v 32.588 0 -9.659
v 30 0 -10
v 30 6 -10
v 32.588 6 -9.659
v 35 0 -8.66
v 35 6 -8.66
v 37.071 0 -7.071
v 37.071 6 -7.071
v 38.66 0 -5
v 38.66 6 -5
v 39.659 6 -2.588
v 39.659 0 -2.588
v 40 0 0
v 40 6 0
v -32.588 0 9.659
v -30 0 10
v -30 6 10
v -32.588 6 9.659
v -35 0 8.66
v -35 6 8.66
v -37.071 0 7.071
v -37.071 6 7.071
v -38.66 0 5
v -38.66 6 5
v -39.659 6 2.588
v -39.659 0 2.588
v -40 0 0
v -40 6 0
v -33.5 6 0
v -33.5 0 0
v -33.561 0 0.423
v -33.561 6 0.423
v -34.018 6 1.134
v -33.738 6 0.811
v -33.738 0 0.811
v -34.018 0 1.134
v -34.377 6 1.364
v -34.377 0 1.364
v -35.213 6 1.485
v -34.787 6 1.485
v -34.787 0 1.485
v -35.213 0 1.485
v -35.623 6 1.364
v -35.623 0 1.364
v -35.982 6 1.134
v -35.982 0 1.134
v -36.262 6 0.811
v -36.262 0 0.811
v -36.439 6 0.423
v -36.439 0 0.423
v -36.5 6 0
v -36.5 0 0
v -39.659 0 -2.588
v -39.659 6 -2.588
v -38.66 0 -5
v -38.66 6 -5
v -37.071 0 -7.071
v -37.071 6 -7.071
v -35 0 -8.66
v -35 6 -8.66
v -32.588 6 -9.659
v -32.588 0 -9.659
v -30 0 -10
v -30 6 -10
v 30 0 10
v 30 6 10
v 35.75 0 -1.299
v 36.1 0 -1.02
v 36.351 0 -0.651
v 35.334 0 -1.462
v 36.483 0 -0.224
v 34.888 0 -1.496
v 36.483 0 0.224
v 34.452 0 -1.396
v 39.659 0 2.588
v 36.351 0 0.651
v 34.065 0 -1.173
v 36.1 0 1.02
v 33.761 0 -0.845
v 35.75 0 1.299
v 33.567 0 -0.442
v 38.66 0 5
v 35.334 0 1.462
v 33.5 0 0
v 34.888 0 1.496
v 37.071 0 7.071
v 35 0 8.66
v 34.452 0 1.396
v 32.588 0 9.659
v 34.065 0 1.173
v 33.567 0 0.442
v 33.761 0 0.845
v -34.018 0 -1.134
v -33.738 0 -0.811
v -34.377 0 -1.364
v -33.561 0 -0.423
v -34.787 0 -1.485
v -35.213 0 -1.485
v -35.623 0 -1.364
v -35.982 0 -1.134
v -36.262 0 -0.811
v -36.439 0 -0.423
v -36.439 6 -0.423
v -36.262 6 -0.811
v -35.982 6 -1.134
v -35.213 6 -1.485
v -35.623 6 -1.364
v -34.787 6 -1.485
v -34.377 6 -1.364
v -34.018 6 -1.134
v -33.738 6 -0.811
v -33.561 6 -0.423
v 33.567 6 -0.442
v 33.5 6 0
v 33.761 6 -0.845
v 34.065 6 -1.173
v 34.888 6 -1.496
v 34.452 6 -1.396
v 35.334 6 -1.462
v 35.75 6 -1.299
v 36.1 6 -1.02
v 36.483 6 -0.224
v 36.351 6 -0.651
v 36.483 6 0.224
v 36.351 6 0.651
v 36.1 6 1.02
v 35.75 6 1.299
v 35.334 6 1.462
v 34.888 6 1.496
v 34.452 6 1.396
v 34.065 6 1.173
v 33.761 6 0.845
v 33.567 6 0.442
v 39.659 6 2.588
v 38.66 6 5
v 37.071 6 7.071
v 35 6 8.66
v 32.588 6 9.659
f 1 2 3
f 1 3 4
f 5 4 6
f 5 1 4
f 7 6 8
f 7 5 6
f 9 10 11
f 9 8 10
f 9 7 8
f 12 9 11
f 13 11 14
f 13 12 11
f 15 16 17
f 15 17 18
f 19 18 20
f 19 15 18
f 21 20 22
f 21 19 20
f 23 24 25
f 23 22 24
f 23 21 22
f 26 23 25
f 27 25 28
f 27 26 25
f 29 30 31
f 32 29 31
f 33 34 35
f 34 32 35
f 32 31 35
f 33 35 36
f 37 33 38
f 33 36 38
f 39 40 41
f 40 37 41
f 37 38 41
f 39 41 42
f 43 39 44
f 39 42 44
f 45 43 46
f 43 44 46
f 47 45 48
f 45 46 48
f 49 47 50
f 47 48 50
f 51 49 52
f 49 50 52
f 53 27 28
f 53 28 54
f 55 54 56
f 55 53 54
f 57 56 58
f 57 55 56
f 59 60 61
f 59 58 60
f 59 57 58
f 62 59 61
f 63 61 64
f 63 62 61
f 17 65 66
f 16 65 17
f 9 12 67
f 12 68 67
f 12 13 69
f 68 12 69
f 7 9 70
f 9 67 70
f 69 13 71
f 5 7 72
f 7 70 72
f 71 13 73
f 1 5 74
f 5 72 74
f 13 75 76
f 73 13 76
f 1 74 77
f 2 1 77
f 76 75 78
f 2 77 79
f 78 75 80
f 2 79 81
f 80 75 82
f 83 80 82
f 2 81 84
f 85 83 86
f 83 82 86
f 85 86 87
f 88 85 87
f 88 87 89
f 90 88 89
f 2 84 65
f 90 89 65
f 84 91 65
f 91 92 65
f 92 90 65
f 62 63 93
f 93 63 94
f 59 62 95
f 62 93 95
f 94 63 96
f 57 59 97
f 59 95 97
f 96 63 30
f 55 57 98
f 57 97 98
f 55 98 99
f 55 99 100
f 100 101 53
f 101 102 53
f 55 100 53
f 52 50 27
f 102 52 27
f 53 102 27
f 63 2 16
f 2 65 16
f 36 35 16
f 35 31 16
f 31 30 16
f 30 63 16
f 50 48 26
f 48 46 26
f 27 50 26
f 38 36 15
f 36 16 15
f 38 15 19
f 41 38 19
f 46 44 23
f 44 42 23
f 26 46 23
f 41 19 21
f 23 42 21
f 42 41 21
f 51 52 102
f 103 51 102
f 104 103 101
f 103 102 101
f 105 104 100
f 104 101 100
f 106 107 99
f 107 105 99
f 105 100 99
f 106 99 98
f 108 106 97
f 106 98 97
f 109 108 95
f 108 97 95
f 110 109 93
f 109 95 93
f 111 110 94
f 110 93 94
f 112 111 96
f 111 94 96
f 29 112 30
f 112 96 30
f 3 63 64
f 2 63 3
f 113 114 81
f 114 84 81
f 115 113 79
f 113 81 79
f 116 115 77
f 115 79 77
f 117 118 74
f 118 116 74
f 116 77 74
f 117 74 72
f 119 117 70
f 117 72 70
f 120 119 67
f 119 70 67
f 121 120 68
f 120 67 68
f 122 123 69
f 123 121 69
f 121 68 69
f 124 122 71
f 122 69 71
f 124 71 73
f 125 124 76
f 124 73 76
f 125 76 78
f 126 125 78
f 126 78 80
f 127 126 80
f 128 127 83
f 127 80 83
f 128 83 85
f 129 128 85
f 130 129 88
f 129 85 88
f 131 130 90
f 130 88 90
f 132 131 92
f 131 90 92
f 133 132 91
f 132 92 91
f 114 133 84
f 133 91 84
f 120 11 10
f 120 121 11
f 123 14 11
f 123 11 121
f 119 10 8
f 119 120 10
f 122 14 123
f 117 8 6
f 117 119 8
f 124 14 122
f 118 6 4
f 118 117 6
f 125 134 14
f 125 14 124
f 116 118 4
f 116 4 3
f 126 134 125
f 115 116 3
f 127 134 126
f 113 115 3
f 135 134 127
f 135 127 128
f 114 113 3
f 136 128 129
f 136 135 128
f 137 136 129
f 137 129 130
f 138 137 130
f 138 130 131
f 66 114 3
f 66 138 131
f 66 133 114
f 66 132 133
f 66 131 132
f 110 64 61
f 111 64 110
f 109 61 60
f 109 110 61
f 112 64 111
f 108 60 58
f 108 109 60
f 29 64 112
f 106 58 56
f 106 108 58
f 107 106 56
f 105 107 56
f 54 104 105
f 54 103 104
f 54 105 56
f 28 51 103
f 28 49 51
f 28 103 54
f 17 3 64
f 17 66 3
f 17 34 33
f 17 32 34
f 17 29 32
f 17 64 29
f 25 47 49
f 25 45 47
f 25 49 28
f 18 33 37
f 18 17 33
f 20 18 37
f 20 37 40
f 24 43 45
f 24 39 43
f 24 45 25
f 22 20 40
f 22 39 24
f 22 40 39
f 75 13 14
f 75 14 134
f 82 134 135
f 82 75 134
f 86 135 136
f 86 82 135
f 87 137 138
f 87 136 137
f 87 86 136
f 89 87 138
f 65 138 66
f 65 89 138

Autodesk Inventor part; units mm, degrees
ref_plane "YZ Plane" through (0, 0, 0) normal (1, 0, 0) x (0, 1, 0)
ref_plane "XZ Plane" through (0, 0, 0) normal (0, 1, 0) x (-1, 0, 0)
ref_plane "XY Plane" through (0, 0, 0) normal (0, 0, 1) x (1, 0, 0)
sketch "Sketch1" plane through (0, 0, 0) normal (0, 1, 0) x (-1, 0, 0)
  line L0 (30, -10) -> (-30, -10)
  line L1 (-40, 0) -> (-40, 0)
  line L2 (-30, 10) -> (30, 10)
  line L3 (40, 0) -> (40, 0)
  line L4 (40, -10) -> (-40, 10) construction
  line L5 (-40, -10) -> (40, 10) construction
  line L6 (0, 0) -> (35, 0)
  line L7 (0, 0) -> (35, 0) construction
  line L8 (0, 0) -> (-35, 0) construction
  line L9 (0, 0) -> (35, 0) construction
  circle A0 centre (35, 0) radius 1.5
  circle A1 centre (-35, 0) radius 1.5
  arc A2 (-30, 10) -> (-40, 0) centre (-30, 0) ccw
  arc A3 (-40, 0) -> (-30, -10) centre (-30, 0) ccw
  arc A4 (30, -10) -> (40, 0) centre (30, 0) ccw
  arc A5 (40, 0) -> (30, 10) centre (30, 0) ccw
  point P0 (40, 0)
  point P1 (-40, 0)
  dimension "d0" = 80
  dimension "d1" = 20
  dimension "d3" = 35
  dimension "d4" = 0
  dimension "d5" = 35
  dimension "d6" = 180
  dimension "d7" = 3
  dimension "d8" = 3
  dimension "d11" = 10
extrude "Extrusion1" add sketch "Sketch1" along normal blind 6
properties part number "fuselagewingconnection"
